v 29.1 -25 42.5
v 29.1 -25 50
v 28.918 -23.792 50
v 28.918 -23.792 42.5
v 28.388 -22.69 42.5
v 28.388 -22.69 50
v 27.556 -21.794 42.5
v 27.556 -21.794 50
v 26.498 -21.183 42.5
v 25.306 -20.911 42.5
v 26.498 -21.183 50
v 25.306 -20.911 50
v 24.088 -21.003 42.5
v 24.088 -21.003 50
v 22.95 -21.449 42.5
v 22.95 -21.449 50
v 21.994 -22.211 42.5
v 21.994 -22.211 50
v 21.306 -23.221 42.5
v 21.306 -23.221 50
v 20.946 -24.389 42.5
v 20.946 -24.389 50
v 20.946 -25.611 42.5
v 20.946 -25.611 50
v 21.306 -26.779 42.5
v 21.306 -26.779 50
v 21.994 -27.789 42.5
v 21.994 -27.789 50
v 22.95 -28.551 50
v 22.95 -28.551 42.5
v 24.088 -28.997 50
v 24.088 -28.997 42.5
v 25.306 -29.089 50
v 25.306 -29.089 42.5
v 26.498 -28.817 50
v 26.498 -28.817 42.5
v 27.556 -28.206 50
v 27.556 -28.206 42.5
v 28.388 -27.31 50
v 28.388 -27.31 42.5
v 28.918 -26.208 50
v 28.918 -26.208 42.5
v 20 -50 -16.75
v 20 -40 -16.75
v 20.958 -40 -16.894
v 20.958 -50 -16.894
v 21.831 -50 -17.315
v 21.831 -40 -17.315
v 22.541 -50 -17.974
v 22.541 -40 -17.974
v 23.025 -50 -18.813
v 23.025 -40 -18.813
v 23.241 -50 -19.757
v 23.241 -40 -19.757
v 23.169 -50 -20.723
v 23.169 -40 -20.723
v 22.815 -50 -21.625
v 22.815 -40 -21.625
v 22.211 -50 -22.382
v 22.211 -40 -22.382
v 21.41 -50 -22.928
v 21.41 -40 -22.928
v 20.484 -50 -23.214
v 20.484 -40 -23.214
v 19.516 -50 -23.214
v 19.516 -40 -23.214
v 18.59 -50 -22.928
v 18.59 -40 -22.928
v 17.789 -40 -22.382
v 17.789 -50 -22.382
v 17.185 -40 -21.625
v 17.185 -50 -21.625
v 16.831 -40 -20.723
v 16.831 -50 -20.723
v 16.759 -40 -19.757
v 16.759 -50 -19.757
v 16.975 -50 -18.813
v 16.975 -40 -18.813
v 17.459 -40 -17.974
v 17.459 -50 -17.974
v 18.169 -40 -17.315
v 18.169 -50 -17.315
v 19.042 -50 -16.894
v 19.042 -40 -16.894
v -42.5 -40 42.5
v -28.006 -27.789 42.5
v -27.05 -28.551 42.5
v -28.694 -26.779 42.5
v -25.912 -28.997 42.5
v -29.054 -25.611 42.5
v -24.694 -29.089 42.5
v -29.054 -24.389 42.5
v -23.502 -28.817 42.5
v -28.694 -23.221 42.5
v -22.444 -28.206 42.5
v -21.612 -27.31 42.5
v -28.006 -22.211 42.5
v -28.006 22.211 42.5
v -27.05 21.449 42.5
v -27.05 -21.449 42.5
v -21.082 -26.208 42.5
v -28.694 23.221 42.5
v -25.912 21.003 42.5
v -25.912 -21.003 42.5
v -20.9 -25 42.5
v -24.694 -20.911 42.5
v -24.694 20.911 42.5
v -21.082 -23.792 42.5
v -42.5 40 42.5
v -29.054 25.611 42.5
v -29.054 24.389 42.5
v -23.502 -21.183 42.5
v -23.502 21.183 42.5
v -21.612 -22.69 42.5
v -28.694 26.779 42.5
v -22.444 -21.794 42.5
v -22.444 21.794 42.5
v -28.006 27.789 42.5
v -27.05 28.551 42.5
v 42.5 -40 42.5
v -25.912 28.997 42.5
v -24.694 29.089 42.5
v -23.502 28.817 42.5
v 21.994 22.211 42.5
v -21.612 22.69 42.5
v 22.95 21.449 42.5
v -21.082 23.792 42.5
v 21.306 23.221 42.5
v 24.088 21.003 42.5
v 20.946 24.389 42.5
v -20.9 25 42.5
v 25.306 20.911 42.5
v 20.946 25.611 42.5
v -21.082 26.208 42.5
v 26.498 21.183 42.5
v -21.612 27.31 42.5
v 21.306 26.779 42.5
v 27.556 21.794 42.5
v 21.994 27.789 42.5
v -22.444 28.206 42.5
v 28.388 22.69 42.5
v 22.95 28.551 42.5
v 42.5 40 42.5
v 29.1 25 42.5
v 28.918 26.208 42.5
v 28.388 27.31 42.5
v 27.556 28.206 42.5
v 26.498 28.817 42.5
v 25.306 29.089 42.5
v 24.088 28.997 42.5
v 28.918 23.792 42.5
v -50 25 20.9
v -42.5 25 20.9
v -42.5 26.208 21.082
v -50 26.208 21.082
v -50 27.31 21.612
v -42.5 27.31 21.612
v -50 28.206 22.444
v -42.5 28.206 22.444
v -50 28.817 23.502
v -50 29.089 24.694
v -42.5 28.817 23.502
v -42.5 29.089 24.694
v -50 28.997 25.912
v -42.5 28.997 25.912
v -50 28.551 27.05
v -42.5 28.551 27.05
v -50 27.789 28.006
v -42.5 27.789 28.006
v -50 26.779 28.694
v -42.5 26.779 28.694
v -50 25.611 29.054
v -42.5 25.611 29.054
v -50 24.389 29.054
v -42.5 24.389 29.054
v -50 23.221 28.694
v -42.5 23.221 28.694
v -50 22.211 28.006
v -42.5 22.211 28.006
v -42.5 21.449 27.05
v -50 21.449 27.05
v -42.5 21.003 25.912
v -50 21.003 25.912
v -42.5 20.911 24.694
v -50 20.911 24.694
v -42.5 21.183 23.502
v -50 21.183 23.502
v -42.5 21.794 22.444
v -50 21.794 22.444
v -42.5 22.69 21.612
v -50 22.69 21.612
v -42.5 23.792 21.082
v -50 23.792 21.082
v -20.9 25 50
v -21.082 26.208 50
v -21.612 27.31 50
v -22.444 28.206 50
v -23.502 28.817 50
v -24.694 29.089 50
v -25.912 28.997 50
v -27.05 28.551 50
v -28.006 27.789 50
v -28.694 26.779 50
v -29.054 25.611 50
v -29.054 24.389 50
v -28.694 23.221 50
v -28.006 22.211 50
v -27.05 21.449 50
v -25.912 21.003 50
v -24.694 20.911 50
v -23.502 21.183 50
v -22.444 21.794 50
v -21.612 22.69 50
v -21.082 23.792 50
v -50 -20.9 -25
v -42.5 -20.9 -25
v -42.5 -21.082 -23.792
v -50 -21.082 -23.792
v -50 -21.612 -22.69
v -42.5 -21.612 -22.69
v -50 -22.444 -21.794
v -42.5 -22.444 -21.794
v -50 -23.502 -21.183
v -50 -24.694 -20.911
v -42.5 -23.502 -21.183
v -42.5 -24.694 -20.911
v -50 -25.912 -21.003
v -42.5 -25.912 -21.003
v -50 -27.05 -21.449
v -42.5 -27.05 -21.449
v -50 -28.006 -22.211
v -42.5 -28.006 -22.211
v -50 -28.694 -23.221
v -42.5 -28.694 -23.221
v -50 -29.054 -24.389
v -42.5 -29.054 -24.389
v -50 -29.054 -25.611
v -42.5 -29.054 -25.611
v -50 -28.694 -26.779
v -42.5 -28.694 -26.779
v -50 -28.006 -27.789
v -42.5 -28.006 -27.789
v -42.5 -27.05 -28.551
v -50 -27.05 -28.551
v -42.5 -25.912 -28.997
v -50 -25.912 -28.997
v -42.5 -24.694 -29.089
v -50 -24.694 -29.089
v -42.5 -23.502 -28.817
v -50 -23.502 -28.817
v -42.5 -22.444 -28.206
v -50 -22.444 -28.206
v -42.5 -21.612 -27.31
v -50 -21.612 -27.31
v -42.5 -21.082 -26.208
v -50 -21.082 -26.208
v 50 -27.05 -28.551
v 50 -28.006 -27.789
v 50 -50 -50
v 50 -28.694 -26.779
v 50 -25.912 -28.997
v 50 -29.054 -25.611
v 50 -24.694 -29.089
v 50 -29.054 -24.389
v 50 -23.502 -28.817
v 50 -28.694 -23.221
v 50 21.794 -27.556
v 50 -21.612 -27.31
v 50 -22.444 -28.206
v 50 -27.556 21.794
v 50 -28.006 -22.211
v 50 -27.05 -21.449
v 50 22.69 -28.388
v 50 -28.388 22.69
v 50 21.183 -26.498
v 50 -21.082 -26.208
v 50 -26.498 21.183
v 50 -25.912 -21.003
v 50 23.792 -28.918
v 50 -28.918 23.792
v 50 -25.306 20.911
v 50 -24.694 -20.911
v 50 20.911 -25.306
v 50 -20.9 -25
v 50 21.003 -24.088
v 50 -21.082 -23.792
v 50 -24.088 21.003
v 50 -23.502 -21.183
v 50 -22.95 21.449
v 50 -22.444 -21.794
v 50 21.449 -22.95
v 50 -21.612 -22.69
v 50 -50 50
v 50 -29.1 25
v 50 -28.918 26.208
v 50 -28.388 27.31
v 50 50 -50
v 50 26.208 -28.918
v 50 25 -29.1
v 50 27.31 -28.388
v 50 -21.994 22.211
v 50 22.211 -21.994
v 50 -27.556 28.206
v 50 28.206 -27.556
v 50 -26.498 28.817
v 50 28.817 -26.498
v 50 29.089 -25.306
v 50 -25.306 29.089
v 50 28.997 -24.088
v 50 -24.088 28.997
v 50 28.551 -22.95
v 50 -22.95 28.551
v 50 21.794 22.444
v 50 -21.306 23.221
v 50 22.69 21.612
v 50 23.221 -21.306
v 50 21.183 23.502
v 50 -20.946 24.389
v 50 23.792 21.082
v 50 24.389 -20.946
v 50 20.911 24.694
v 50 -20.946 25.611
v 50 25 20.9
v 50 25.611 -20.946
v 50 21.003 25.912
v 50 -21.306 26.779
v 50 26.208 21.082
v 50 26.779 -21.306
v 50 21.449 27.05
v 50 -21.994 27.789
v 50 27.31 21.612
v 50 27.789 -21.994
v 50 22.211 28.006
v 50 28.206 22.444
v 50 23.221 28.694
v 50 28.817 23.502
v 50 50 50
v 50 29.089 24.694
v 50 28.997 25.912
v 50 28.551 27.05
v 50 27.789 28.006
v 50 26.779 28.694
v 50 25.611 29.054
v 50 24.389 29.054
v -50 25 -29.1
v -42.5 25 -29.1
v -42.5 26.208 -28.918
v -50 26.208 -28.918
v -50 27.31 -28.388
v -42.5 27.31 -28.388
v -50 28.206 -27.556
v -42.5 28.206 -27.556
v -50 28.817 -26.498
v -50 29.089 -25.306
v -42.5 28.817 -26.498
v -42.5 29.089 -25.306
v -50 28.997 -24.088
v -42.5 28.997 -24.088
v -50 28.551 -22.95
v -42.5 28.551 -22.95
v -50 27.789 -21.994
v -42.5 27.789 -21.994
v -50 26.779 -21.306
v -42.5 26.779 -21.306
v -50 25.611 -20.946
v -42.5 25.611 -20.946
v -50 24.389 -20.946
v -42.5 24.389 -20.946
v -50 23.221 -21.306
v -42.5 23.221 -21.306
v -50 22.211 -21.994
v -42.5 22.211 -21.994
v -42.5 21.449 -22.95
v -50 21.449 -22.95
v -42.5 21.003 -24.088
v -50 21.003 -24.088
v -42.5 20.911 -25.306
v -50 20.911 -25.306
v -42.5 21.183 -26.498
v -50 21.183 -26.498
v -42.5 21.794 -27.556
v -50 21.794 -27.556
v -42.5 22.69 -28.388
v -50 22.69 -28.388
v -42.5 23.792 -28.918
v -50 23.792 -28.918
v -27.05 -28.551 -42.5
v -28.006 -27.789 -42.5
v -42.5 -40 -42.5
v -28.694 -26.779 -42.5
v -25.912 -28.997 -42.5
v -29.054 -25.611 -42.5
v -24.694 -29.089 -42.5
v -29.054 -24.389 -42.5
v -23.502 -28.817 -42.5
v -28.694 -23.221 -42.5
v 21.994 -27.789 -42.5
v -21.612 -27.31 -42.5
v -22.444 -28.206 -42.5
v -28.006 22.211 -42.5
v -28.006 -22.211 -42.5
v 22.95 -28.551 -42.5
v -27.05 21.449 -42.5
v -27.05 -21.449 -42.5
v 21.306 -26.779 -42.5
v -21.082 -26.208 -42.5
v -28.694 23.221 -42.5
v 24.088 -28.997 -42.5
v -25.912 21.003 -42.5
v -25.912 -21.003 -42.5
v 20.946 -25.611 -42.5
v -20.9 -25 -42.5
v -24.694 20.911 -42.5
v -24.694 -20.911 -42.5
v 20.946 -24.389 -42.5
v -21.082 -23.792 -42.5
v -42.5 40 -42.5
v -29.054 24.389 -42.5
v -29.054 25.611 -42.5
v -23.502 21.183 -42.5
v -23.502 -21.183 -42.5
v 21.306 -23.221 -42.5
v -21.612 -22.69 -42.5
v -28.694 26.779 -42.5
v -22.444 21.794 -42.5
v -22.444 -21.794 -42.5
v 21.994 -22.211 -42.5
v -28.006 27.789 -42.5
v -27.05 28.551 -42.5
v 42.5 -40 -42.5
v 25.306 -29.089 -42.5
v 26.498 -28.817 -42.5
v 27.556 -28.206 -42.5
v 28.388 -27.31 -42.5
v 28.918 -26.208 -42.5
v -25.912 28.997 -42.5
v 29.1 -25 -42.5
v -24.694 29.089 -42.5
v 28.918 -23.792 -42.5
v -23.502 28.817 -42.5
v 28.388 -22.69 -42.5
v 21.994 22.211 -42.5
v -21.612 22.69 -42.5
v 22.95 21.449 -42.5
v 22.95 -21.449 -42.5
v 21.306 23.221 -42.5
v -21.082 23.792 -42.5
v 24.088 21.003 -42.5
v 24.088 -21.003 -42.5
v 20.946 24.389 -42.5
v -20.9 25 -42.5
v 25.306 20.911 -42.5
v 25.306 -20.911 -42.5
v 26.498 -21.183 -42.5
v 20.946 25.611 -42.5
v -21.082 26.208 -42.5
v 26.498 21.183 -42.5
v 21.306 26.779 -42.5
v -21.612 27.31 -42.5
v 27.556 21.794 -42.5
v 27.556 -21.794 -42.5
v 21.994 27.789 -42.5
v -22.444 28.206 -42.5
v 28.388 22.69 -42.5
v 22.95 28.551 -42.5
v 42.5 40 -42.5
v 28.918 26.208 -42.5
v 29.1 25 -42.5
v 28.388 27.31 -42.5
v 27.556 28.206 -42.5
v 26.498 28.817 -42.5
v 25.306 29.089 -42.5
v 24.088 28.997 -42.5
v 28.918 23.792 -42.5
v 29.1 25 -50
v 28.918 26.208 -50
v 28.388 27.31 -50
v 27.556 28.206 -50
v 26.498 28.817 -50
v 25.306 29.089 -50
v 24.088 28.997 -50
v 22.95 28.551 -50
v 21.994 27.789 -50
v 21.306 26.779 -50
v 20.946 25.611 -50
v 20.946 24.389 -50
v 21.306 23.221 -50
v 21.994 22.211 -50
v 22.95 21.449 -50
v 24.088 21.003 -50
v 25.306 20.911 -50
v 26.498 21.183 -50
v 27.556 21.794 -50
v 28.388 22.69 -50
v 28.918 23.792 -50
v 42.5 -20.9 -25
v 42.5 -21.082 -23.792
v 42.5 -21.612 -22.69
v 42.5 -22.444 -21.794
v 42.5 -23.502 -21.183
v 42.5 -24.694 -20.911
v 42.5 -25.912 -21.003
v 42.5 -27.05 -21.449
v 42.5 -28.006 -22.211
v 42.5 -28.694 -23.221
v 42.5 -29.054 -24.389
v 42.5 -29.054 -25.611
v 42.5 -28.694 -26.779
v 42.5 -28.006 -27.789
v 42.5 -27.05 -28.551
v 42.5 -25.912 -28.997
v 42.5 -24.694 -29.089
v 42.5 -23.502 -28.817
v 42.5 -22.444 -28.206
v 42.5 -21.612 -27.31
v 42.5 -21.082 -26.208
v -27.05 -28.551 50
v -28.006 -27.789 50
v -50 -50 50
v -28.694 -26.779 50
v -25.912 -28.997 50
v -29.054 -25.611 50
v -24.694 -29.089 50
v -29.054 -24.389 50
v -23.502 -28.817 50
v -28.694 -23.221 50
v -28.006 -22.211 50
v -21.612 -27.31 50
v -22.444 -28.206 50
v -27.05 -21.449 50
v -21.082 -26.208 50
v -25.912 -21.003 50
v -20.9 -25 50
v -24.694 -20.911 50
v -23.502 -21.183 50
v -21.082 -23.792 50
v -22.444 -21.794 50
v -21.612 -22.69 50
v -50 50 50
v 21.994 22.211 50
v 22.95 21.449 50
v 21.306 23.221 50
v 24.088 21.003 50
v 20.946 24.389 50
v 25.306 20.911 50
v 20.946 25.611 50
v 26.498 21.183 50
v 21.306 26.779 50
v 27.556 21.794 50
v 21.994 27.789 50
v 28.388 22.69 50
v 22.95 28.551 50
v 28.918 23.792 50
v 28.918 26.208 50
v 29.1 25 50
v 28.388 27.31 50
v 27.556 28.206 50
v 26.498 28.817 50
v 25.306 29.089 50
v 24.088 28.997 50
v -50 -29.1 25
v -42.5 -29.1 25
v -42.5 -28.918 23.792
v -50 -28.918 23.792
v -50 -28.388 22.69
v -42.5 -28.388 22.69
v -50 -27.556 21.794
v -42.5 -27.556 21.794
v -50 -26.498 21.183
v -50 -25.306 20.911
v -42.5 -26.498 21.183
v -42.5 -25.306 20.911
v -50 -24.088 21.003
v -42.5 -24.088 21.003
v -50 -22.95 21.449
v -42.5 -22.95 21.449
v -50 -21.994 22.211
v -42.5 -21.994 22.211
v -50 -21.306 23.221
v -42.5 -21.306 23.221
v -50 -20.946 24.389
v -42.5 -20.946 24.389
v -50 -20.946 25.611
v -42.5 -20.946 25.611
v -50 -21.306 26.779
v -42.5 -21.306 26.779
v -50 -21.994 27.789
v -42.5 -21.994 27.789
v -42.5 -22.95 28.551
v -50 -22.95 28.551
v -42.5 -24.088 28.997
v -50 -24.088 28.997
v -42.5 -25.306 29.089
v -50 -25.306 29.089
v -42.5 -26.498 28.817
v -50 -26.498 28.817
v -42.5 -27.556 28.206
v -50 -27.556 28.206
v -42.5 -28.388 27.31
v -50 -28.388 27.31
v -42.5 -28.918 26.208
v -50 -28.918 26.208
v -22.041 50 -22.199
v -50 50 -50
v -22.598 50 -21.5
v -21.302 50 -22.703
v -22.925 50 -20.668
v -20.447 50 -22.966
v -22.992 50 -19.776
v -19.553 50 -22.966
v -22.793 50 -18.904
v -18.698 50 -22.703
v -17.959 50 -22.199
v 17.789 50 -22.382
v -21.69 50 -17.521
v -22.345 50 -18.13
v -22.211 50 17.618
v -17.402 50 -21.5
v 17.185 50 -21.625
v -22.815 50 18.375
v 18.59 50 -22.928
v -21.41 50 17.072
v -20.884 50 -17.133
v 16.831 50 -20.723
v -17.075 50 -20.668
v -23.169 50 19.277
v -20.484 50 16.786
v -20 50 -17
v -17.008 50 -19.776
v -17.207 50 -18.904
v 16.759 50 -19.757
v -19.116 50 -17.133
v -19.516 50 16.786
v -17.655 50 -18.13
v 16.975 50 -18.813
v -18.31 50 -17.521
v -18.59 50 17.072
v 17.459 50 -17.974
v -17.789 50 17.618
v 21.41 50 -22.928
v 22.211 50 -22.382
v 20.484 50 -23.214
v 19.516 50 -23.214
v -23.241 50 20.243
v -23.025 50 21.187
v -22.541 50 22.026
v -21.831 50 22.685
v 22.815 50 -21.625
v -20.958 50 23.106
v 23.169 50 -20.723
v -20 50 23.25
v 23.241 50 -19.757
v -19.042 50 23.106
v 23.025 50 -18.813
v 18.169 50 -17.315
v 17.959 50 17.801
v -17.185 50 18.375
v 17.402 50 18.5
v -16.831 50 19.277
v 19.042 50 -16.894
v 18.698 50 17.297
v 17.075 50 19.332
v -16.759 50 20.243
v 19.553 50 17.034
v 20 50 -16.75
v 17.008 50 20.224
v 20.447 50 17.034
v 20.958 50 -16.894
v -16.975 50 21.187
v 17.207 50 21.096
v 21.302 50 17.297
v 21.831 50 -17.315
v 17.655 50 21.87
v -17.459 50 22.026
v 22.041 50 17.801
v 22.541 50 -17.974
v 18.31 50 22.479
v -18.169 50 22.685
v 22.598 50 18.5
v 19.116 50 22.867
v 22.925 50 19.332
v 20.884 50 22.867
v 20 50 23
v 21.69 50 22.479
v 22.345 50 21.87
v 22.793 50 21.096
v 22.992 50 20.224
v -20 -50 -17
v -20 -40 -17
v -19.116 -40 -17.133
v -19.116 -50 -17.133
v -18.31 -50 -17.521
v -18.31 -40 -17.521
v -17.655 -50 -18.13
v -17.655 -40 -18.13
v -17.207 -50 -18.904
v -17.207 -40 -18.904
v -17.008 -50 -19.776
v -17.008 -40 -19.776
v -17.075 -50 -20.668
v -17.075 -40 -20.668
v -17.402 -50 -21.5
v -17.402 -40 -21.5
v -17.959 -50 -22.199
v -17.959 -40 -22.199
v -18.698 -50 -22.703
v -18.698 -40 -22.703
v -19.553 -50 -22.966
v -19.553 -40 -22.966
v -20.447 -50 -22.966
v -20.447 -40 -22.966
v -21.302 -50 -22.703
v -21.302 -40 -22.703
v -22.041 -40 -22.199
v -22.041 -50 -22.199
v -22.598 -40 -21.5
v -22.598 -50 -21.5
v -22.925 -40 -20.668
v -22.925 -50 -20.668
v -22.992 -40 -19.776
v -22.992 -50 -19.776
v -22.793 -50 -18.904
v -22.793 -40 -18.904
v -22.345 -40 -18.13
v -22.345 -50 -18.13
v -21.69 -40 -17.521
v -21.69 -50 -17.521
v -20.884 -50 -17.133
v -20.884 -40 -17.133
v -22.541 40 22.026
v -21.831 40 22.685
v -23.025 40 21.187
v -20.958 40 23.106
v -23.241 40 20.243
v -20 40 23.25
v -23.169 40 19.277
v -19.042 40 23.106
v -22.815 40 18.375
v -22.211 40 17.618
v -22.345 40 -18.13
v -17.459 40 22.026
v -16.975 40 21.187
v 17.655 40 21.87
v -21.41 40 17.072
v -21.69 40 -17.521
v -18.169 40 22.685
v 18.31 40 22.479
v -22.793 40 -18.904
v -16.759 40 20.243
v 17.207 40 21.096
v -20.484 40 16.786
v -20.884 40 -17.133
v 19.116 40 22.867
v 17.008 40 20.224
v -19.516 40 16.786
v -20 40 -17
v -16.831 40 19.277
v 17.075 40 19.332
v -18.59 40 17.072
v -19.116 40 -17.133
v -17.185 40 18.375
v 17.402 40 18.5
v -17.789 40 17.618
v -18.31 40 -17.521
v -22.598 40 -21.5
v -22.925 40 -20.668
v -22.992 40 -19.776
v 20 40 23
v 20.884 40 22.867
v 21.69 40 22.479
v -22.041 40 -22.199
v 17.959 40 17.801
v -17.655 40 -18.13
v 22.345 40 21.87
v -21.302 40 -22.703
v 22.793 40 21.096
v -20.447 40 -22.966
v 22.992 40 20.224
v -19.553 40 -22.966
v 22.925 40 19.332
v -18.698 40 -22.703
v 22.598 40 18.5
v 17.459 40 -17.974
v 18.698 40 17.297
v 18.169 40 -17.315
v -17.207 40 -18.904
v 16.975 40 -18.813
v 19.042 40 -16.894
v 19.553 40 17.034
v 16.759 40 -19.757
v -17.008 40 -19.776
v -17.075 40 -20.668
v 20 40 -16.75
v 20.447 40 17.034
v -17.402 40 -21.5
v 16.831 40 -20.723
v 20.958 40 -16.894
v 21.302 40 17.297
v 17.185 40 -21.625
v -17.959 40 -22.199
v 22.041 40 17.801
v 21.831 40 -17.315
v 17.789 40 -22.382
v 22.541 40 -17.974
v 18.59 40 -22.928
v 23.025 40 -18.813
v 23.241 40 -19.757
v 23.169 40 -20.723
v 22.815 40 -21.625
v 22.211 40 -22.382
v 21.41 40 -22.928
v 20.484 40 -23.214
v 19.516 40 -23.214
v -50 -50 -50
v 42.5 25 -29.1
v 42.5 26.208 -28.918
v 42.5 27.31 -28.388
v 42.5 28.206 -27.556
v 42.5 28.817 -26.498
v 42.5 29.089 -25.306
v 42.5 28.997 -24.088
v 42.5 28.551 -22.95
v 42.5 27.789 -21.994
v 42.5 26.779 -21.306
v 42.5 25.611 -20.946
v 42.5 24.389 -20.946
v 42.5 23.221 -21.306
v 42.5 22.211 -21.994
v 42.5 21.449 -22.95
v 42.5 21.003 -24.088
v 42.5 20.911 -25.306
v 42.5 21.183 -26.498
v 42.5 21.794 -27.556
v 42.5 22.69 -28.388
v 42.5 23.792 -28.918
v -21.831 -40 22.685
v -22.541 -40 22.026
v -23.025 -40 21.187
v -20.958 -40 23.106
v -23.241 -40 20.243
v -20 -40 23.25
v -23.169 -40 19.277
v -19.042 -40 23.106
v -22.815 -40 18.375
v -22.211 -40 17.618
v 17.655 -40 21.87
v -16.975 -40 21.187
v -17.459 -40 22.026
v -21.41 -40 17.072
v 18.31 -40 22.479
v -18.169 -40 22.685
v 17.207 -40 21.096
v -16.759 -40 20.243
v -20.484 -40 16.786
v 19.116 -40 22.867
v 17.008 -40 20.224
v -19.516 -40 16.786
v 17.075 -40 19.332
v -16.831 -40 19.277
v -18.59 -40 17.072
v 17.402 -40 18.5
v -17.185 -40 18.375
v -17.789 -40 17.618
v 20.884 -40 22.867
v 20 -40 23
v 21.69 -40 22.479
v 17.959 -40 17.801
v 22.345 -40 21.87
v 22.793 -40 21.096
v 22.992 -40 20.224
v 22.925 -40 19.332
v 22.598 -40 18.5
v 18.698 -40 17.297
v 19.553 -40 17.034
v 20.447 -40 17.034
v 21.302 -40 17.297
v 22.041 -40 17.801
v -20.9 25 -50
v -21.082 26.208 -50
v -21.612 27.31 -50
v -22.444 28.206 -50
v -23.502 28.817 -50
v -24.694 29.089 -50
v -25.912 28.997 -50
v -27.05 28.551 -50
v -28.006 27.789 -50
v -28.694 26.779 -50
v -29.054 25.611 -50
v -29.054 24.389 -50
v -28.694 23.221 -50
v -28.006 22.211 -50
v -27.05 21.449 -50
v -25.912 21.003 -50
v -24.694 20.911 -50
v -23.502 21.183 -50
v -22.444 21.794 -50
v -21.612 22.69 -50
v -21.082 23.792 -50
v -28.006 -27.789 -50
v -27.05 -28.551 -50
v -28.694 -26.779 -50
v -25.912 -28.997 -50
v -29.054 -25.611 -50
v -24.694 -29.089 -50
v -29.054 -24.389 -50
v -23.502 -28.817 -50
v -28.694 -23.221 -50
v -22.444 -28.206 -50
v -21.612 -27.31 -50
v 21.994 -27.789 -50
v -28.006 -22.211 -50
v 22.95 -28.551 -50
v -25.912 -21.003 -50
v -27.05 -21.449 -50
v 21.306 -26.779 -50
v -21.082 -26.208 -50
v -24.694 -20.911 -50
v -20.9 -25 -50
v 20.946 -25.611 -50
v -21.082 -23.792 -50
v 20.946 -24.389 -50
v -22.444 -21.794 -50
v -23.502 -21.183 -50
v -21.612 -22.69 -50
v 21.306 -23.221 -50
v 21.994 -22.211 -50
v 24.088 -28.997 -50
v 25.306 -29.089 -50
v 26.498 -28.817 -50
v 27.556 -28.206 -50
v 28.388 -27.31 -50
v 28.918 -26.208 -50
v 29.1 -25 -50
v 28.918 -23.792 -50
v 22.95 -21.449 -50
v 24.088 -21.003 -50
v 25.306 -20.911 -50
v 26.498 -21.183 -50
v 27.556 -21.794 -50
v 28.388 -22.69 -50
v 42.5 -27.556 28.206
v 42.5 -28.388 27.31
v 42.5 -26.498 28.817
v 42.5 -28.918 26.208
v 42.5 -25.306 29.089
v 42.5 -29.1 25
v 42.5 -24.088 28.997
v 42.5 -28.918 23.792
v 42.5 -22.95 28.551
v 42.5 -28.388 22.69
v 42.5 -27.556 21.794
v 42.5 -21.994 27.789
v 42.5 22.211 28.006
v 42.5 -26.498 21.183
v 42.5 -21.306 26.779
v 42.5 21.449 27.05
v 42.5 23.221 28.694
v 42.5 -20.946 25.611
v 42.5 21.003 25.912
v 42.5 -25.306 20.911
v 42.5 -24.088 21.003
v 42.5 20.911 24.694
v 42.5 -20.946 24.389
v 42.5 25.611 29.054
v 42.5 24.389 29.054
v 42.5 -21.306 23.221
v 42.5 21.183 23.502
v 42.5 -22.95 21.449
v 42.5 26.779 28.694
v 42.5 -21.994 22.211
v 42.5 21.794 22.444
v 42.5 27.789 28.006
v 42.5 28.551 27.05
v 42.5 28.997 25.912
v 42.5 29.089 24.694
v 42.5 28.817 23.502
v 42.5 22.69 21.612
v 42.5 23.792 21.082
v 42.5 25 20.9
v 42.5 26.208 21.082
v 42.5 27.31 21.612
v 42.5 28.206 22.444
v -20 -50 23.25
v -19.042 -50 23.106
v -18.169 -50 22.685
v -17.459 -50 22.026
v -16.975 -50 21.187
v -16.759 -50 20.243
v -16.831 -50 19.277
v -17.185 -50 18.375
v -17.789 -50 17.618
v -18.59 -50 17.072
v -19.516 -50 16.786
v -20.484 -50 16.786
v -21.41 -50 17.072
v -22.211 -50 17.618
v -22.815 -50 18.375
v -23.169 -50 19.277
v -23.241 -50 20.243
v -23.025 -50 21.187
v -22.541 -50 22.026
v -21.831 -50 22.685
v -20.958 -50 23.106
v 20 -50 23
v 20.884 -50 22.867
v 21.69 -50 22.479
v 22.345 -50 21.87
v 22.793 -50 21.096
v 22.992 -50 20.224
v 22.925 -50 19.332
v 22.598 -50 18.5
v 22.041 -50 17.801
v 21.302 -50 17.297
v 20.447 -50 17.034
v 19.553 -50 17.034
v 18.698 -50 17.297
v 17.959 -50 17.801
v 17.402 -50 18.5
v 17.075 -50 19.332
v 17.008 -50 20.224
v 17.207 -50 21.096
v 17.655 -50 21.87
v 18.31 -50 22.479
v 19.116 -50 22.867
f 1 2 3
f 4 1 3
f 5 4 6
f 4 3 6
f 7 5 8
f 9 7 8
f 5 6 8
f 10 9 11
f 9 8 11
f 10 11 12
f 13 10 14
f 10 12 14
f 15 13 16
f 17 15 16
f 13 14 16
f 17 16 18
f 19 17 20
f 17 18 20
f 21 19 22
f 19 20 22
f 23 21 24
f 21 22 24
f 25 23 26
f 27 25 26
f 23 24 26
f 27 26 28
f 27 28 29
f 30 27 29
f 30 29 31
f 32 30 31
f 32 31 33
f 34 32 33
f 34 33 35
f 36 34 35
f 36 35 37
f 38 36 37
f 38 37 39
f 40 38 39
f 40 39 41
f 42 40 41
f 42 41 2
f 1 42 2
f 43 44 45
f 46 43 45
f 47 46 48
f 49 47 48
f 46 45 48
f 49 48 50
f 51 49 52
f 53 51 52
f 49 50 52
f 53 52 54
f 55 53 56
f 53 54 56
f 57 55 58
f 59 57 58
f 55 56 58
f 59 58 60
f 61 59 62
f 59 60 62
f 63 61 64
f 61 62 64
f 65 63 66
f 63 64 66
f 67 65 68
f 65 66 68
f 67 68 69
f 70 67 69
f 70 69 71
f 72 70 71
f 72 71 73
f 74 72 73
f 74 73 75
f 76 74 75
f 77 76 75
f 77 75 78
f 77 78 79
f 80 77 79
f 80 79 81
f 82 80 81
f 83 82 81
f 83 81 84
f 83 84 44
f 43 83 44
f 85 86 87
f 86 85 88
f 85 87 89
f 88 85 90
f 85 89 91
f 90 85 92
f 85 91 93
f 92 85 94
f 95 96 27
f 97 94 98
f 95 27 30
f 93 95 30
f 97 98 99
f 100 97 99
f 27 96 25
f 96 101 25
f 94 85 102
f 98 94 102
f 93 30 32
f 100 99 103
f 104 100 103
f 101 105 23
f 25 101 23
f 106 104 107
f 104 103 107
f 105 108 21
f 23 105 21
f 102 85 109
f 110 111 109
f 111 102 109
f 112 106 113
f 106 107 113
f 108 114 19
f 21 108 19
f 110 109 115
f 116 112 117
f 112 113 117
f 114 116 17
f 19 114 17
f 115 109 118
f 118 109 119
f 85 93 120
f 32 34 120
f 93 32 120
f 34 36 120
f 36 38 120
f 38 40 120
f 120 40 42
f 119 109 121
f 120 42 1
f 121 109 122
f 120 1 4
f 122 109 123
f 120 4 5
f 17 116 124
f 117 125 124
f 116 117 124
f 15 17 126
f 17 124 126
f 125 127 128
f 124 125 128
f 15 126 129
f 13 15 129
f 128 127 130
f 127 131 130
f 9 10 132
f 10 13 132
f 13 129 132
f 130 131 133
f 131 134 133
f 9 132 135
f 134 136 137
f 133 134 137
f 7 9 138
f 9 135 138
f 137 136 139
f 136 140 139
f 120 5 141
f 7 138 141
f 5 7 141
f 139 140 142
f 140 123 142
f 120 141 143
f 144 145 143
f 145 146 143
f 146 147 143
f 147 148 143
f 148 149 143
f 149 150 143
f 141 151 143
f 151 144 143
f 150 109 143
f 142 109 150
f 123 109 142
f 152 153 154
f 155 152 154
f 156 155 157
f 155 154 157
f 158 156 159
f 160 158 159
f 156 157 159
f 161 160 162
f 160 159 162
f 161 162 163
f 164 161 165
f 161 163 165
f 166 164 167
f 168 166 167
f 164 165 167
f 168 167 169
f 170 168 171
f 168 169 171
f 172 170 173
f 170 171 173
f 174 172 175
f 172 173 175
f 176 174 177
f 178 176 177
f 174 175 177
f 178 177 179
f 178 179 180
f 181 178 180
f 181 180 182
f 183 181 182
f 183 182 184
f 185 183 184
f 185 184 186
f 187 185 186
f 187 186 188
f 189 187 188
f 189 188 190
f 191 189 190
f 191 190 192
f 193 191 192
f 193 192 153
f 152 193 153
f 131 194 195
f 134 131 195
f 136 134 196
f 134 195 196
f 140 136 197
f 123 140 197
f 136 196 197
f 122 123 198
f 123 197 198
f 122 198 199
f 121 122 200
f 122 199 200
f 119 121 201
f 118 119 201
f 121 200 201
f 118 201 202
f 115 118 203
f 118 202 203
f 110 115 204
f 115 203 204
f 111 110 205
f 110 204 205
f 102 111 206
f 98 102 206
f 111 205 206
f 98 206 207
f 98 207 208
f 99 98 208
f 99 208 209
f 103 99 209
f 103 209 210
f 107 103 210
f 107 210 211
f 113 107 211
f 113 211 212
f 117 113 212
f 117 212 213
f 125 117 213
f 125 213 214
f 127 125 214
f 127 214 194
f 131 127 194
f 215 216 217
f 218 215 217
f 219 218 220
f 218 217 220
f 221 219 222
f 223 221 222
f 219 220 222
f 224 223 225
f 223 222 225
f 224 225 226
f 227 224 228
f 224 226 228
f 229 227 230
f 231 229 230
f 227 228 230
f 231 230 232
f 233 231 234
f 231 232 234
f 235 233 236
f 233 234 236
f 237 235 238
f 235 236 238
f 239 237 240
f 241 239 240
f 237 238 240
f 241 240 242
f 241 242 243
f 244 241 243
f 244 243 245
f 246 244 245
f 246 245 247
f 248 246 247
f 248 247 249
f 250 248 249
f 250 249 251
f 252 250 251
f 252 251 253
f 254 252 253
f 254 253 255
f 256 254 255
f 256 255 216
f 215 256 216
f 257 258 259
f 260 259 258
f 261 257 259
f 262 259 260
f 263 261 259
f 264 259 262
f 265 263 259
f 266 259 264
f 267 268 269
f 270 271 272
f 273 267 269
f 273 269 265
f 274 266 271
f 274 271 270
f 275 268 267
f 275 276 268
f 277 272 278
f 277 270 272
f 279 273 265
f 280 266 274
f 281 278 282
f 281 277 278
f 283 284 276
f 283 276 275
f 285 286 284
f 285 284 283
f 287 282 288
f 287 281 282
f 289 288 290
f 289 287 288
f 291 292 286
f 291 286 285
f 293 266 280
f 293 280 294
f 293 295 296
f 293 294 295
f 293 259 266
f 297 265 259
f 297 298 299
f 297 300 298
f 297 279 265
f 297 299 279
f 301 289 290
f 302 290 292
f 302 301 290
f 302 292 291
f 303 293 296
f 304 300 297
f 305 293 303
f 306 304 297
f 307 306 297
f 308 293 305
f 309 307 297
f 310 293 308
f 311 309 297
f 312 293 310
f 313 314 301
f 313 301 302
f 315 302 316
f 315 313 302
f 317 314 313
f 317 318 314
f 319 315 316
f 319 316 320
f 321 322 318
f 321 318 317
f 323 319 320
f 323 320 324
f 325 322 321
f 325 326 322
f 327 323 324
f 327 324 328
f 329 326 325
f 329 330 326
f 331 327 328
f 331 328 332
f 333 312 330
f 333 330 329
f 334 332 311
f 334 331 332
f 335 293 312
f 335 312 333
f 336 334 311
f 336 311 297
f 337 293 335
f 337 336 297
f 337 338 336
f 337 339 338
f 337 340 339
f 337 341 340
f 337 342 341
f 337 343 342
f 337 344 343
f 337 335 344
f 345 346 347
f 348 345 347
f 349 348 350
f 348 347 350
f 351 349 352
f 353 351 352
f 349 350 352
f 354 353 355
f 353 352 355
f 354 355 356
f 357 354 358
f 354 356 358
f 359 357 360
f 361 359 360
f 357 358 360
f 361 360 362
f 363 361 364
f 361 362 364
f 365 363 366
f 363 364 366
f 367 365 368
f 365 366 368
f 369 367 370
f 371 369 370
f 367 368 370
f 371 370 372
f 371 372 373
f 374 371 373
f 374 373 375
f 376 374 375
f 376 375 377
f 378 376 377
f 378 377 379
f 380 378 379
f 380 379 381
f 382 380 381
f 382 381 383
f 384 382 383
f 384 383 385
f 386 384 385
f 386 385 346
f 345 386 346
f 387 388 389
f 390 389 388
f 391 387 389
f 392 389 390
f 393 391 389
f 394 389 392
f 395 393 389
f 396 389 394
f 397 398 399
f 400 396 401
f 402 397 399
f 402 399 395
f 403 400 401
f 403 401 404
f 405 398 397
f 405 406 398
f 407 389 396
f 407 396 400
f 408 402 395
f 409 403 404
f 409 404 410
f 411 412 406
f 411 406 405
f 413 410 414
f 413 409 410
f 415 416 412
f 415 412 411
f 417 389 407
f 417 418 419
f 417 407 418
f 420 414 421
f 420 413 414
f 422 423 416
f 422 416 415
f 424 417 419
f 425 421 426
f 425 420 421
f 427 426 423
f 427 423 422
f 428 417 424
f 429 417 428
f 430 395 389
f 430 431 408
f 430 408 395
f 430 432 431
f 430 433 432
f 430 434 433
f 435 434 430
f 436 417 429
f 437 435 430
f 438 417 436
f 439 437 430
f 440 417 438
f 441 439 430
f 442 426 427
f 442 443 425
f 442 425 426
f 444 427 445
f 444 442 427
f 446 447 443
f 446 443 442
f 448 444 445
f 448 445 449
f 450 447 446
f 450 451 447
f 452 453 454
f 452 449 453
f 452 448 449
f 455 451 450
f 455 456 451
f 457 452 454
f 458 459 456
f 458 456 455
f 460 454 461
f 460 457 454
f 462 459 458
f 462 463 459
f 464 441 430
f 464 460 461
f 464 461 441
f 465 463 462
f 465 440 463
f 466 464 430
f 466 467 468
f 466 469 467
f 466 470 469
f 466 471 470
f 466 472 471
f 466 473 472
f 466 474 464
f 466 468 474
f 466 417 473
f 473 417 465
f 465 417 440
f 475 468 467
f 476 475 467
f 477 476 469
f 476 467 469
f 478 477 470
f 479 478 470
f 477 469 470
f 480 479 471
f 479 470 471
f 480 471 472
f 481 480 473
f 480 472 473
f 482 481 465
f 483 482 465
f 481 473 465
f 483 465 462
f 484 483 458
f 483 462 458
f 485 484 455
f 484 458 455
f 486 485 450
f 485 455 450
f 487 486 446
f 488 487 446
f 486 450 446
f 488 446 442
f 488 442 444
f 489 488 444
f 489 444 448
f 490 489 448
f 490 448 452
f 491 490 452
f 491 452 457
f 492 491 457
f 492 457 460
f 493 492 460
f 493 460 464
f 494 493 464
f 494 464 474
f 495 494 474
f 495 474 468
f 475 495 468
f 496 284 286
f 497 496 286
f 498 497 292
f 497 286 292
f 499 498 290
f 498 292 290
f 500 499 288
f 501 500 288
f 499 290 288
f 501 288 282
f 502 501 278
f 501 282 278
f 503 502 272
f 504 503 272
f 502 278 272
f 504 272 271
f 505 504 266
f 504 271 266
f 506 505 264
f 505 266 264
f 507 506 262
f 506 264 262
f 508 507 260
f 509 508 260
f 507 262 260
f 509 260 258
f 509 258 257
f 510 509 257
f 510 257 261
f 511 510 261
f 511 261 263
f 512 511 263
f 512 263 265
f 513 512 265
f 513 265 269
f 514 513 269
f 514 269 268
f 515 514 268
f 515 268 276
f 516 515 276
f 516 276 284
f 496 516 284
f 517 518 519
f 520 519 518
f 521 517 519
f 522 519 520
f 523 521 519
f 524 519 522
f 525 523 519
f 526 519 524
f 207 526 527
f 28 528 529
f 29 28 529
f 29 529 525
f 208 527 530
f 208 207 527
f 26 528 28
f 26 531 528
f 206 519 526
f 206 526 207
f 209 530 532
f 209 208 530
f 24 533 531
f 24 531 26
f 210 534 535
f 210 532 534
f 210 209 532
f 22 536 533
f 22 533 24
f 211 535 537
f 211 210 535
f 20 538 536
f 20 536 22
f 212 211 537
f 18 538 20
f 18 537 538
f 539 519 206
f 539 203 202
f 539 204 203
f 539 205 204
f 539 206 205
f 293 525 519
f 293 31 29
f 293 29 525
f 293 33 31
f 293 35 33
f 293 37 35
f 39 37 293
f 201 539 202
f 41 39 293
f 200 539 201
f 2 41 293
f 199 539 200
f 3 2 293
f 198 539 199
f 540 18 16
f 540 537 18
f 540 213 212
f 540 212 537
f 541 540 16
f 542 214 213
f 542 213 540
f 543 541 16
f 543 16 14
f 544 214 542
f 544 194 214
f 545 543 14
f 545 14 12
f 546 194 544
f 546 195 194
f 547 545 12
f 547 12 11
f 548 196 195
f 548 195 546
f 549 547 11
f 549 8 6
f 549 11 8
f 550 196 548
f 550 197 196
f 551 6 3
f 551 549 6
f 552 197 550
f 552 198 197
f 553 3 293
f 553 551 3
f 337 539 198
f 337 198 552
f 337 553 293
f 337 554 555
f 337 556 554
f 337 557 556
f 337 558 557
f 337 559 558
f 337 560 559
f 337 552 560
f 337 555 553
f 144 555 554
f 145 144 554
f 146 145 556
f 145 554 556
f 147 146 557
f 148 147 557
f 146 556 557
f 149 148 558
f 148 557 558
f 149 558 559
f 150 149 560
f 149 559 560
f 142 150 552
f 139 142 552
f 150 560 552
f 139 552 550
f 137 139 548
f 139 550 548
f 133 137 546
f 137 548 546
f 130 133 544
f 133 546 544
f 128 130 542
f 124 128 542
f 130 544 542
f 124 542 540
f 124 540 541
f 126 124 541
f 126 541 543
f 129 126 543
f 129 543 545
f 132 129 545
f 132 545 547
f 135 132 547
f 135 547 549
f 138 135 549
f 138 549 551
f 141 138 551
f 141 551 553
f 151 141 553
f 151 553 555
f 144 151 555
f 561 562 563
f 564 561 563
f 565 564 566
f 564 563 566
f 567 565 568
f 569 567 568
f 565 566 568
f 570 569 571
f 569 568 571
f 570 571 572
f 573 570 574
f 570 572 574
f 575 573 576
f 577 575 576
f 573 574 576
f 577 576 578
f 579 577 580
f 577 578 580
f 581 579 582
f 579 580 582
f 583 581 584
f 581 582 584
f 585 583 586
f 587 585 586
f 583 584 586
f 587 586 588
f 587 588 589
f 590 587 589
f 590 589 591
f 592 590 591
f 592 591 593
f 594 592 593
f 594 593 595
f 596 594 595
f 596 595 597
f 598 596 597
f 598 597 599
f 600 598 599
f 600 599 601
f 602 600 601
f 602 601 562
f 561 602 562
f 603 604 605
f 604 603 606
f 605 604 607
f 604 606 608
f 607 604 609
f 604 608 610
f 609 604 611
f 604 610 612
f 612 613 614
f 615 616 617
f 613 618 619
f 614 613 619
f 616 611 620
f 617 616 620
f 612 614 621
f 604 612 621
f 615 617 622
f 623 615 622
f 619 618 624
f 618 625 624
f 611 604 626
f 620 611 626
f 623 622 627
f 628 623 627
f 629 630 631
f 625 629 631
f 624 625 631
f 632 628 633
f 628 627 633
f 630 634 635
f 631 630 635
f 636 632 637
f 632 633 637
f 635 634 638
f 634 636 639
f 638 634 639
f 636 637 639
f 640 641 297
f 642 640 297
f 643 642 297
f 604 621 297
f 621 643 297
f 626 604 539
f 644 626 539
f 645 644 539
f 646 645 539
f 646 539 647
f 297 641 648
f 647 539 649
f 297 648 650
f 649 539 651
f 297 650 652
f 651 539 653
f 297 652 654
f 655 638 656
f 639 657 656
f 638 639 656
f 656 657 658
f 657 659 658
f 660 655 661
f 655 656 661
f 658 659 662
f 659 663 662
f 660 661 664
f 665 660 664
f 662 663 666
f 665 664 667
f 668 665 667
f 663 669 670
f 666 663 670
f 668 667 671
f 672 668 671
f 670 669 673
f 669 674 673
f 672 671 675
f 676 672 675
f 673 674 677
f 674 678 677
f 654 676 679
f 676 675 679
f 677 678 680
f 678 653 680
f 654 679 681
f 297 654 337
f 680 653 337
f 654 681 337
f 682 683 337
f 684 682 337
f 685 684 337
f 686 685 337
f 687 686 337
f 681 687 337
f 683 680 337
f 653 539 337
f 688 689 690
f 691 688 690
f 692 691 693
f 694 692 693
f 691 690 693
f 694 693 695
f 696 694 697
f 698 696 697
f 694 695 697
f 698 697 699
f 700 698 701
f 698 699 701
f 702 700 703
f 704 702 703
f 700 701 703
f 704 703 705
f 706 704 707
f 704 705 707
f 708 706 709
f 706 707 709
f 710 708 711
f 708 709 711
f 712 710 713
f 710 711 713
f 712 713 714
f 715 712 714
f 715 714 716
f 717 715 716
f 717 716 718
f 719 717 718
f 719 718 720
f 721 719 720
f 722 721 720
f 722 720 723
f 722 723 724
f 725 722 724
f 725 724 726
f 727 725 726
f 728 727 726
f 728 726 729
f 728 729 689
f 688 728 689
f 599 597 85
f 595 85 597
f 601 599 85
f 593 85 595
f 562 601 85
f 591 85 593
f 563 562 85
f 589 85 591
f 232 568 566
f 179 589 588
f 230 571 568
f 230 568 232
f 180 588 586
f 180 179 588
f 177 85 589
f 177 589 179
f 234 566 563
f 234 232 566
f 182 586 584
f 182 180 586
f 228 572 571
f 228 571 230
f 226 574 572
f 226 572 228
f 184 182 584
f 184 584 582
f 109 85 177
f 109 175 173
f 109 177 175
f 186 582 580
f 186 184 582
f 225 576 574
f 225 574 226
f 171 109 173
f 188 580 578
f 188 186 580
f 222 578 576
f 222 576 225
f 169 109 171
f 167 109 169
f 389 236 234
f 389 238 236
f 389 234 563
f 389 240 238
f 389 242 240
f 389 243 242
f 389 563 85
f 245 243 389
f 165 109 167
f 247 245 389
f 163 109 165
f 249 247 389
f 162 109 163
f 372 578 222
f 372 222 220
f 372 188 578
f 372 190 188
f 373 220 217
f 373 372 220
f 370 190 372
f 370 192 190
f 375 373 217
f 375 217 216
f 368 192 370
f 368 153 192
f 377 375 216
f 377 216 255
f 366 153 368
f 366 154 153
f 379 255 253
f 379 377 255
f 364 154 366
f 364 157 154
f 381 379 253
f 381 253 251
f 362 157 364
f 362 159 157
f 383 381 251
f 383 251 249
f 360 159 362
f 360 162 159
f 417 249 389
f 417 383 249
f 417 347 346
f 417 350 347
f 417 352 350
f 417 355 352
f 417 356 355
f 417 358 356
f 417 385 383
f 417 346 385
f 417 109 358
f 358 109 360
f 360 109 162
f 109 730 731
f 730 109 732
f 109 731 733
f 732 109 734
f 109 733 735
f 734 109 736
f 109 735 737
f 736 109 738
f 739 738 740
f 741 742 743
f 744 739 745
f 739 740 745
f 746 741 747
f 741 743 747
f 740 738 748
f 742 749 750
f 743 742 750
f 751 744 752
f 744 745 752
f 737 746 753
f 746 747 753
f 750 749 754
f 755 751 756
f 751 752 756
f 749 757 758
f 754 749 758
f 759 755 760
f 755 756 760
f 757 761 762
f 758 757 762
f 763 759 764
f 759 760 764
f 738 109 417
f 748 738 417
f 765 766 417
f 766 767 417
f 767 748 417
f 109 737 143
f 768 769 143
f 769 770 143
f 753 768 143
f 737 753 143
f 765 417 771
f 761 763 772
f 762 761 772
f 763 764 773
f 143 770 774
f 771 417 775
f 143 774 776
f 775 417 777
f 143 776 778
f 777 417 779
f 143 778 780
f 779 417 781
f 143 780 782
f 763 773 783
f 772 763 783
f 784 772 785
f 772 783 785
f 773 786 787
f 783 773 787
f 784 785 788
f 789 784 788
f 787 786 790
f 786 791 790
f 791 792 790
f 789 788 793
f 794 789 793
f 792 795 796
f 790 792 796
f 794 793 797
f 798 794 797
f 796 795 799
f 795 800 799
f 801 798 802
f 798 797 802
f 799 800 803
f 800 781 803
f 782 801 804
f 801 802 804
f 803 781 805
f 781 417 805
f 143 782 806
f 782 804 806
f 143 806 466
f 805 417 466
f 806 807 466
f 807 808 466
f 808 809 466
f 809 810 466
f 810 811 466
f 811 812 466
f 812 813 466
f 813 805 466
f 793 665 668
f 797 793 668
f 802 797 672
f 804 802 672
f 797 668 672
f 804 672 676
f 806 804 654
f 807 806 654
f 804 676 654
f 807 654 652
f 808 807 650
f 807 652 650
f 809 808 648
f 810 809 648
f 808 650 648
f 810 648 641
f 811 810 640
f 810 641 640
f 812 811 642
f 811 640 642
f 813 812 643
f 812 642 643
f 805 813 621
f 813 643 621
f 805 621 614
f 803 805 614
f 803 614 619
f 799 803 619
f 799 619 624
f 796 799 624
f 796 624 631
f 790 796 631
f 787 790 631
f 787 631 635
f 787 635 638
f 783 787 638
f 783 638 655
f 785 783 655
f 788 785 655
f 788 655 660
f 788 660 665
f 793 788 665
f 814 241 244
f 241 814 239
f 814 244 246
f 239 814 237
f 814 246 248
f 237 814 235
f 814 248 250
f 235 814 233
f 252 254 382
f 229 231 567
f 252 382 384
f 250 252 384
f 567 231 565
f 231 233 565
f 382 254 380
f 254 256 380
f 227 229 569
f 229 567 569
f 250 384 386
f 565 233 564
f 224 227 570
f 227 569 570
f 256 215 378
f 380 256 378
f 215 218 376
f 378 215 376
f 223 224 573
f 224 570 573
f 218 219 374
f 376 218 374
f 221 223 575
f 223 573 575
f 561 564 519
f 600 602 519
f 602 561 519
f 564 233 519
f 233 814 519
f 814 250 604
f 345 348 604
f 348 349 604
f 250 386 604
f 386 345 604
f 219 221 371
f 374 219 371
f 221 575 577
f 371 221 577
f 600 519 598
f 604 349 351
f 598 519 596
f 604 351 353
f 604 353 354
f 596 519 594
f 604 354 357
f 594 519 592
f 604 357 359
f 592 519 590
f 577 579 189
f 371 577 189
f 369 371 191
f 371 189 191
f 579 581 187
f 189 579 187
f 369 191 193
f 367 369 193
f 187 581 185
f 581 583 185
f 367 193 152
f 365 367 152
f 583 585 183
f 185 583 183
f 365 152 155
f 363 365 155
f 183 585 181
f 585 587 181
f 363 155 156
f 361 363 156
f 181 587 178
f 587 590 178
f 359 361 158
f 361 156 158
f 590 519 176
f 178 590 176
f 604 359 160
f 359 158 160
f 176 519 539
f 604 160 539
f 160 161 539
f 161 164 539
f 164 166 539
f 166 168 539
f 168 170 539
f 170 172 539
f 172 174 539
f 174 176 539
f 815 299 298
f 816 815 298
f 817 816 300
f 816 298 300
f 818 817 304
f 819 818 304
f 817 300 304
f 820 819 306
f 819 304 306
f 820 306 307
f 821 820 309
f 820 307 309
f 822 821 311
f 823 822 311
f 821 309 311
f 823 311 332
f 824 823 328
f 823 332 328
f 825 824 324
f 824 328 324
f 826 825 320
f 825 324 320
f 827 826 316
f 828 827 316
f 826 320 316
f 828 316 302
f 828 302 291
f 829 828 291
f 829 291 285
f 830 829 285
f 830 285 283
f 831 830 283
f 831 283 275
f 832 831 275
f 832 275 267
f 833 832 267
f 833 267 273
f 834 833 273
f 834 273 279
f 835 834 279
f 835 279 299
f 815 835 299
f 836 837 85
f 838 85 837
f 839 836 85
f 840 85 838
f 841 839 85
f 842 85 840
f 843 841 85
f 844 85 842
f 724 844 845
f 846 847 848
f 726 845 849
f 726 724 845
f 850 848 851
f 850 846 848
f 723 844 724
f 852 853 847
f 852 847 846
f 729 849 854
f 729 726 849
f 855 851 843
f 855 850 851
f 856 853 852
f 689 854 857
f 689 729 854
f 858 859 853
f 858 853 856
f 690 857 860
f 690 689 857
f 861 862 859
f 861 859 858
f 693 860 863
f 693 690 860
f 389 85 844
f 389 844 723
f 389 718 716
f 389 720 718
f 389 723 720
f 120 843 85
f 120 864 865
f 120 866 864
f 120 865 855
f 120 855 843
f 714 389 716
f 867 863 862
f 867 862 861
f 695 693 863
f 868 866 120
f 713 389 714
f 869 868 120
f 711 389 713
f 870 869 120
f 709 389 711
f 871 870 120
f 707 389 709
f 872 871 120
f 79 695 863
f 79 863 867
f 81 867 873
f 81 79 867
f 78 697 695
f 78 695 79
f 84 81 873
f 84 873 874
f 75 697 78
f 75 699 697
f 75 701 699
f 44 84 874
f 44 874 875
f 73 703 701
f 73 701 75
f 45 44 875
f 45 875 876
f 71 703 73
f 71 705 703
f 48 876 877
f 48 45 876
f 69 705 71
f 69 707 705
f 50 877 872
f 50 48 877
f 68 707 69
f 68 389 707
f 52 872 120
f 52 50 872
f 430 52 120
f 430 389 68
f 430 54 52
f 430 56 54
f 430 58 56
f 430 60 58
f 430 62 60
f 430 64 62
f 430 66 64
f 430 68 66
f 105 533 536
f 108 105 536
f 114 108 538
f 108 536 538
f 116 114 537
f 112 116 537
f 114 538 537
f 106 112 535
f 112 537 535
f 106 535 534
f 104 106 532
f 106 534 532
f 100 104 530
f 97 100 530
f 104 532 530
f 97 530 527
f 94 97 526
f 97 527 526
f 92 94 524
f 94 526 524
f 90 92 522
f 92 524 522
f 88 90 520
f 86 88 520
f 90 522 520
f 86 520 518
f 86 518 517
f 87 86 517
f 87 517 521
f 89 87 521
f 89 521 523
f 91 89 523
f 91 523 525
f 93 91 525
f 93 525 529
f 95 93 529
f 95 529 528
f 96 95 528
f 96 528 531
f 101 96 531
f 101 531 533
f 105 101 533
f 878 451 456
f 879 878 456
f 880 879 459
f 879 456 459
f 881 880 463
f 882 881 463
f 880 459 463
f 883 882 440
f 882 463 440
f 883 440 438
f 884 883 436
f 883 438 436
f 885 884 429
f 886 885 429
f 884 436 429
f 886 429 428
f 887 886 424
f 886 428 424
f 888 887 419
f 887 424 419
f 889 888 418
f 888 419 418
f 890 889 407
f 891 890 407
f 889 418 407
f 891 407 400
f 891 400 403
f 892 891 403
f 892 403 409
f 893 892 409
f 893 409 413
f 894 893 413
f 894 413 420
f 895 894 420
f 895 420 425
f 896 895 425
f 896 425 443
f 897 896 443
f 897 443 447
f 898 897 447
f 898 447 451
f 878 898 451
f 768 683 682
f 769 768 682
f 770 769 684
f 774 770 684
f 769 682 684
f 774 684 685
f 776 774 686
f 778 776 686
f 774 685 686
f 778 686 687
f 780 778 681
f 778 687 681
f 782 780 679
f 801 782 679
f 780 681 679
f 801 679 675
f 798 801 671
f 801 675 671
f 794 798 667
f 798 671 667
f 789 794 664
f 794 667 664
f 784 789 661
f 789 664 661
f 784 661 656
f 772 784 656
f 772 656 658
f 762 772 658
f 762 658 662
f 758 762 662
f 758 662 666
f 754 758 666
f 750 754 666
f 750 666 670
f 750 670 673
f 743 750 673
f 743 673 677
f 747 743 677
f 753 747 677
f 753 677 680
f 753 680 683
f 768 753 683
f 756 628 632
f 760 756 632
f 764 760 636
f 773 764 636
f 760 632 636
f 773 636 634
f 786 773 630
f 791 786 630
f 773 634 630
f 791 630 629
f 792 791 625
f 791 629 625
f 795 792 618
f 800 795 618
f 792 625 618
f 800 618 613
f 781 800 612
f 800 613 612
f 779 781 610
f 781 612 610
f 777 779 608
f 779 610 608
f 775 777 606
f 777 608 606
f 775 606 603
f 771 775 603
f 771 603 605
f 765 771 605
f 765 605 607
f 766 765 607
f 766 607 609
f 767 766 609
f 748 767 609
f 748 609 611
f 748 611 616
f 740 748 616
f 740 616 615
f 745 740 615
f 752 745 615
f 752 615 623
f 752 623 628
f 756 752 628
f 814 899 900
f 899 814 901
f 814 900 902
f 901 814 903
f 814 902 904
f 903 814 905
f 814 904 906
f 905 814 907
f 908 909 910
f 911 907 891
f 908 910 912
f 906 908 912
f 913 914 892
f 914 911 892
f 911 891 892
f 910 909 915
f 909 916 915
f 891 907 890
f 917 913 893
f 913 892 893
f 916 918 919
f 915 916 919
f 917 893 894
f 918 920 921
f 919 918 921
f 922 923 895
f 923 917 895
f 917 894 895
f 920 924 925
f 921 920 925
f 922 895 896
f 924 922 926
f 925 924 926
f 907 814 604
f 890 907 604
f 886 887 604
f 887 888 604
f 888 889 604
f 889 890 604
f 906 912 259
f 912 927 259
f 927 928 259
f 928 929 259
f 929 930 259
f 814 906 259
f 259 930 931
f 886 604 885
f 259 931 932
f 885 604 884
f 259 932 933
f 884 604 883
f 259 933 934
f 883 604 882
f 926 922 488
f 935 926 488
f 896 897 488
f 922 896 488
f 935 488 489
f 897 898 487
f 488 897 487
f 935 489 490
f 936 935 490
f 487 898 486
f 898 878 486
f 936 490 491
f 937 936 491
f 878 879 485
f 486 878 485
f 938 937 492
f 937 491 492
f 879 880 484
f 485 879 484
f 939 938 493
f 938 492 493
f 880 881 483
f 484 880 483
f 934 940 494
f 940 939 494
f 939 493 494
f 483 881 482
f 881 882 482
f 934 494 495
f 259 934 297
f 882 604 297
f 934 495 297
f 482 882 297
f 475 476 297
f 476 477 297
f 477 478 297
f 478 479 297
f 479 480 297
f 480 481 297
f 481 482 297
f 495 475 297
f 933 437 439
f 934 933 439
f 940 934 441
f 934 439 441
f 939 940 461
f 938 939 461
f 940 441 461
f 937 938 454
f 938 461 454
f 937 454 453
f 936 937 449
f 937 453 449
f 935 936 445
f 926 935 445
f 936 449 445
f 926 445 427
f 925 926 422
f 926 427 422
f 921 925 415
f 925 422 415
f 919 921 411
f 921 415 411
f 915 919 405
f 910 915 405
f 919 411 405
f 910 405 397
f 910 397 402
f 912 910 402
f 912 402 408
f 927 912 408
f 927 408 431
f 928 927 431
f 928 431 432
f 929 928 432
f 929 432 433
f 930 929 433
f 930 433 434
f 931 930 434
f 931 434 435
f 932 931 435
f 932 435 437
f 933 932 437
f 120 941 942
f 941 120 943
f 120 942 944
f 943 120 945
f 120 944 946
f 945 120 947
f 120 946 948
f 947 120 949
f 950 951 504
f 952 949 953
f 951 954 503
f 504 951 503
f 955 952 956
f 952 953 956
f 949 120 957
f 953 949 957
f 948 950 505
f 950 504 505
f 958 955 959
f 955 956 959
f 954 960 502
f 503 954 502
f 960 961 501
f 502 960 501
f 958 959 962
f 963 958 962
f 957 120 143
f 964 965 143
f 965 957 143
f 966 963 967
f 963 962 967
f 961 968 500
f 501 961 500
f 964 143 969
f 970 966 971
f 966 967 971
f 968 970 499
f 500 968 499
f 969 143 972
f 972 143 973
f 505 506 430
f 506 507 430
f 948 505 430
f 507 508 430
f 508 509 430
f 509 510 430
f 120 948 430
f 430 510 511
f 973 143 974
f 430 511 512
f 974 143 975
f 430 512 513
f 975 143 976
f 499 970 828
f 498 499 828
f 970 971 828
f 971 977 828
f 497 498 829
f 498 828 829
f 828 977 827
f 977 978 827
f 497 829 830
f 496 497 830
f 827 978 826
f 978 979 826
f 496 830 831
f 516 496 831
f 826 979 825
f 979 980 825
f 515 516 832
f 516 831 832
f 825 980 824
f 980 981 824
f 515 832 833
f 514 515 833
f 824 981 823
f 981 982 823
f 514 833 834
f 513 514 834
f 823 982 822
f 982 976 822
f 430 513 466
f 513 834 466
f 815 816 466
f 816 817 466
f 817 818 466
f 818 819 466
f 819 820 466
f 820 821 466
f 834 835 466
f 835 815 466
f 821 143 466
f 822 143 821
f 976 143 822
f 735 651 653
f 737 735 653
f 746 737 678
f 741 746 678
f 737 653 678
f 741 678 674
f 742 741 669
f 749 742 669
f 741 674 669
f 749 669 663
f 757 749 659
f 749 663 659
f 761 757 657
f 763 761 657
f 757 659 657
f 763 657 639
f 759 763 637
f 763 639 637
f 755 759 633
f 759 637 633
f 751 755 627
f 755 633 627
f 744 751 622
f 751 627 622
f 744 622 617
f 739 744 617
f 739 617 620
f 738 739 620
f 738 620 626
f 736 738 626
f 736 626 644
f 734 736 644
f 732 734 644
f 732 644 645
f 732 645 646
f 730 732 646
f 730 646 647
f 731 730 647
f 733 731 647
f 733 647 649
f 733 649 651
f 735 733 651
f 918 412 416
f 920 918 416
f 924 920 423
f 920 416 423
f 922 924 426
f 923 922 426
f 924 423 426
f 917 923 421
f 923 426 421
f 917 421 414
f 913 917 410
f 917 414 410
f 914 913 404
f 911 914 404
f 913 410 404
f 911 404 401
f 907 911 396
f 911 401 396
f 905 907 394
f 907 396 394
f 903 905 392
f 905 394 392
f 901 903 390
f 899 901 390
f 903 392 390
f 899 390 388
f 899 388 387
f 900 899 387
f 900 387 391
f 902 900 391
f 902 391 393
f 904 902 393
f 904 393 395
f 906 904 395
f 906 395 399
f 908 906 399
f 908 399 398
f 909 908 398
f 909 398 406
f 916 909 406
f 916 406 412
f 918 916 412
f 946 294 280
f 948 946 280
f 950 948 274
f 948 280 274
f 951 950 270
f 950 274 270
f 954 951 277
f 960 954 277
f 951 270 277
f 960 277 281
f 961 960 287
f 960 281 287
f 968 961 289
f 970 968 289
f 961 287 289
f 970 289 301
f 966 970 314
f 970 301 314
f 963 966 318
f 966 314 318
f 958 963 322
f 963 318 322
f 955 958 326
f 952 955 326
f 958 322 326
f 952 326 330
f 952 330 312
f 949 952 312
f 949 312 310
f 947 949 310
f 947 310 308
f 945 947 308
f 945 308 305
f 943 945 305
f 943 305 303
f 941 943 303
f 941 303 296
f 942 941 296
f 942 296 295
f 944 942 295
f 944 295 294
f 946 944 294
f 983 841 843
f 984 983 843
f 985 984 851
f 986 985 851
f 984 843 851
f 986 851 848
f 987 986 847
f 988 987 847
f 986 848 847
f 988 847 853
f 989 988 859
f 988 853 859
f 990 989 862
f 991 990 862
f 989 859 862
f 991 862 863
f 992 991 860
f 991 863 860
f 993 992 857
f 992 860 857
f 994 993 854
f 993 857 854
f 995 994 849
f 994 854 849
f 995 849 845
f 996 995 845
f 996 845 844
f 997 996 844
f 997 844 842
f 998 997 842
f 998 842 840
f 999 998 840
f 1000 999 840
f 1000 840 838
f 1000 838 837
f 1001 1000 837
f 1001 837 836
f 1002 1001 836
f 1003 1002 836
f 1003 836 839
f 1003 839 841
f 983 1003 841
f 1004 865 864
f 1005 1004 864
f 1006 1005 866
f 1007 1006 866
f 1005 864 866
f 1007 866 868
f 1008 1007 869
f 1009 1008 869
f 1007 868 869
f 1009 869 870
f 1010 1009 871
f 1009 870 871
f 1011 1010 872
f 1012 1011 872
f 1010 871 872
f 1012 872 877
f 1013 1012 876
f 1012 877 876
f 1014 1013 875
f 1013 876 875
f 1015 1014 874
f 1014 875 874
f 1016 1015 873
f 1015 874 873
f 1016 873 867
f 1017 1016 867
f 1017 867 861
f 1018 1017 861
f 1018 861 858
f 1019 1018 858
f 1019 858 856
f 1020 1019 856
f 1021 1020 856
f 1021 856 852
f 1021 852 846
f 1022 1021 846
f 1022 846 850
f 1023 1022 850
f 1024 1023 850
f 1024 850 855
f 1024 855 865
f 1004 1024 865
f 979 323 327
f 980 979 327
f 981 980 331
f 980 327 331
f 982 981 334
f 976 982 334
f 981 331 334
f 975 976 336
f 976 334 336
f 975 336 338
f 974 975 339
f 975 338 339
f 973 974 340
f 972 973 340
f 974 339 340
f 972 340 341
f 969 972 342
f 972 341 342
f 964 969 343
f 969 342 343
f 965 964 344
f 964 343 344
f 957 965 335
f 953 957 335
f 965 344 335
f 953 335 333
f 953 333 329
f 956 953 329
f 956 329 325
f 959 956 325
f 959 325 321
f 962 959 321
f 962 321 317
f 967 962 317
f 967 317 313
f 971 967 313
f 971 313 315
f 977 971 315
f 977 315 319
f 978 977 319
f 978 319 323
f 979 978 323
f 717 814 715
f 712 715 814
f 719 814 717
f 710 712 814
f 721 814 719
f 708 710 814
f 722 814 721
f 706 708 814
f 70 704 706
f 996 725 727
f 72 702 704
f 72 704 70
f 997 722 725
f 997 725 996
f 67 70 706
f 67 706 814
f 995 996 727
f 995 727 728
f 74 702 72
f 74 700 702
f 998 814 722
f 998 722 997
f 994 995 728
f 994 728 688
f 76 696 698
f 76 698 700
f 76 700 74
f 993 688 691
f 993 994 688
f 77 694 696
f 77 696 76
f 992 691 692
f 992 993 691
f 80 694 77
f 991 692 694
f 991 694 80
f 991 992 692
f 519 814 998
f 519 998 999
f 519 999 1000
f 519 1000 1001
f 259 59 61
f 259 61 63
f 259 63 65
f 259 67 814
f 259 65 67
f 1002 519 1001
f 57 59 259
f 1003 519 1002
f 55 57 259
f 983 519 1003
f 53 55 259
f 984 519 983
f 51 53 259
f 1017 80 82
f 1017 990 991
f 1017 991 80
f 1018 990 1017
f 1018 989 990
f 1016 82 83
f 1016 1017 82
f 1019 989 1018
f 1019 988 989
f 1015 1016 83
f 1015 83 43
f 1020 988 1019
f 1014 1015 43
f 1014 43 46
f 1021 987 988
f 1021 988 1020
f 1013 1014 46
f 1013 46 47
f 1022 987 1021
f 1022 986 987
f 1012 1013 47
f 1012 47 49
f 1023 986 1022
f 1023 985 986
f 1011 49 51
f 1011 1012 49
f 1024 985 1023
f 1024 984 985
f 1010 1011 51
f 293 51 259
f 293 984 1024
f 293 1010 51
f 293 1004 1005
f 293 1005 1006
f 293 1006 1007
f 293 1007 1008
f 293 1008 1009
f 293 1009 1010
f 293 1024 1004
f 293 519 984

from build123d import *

# Parameters (mm, degrees)
SKETCH1_W           = 100
SKETCH1_H           = 100
BOSS_EXTRUDE1_DEPTH = 50
SKETCH2_R           = 4.1
CUT_EXTRUDE1_DEPTH  = 123.474487139
SKETCH3_R           = 4.1
CUT_EXTRUDE2_DEPTH  = 123.474487139
SKETCH4_R           = 3
SKETCH4_R_2         = 3.25
CUT_EXTRUDE3_DEPTH  = 123.474487139
SKETCH8_W           = 85
SKETCH8_H           = 85
CUT_EXTRUDE4_DEPTH  = 40


with BuildPart() as part:
    # Sketch1 → Boss-Extrude1 (new, symmetric)
    with BuildSketch(Plane.XY):
        Rectangle(SKETCH1_W, SKETCH1_H)
    extrude(amount=BOSS_EXTRUDE1_DEPTH, both=True)

    # Sketch2 → Cut-Extrude1 (cut, through all)
    with BuildSketch(Plane.XY.offset(50)):
        with Locations((-25, 25)):
            Circle(SKETCH2_R)
        with Locations((25, 25)):
            Circle(SKETCH2_R)
        with Locations((25, -25)):
            Circle(SKETCH2_R)
        with Locations((-25, -25)):
            Circle(SKETCH2_R)
    extrude(amount=-CUT_EXTRUDE1_DEPTH, mode=Mode.SUBTRACT)

    # Sketch3 → Cut-Extrude2 (cut, through all)
    with BuildSketch(Plane(origin=(50, 0, 0), x_dir=(0, 0, -1), z_dir=(1, 0, 0))):
        with Locations((-25, 25)):
            Circle(SKETCH3_R)
        with Locations((25, 25)):
            Circle(SKETCH3_R)
        with Locations(Location((25, -25, 0), (0, 0, 90))):
            Circle(SKETCH3_R)
        with Locations(Location((-25, -25, 0), (0, 0, 270))):
            Circle(SKETCH3_R)
    extrude(amount=-CUT_EXTRUDE2_DEPTH, mode=Mode.SUBTRACT)

    # Sketch4 → Cut-Extrude3 (cut, through all)
    with BuildSketch(Plane(origin=(0, 50, 0), x_dir=(1, 0, 0), z_dir=(0, 1, 0))):
        with Locations(Location((-20, 20, 0), (0, 0, 270))):
            Circle(SKETCH4_R)
        with Locations(Location((20, -20, 0), (0, 0, 270))):
            Circle(SKETCH4_R)
        with Locations(Location((20, 20, 0), (0, 0, 270))):
            Circle(SKETCH4_R_2)
        with Locations(Location((-20, -20, 0), (0, 0, 270))):
            Circle(SKETCH4_R_2)
    extrude(amount=-CUT_EXTRUDE3_DEPTH, mode=Mode.SUBTRACT)

    # Sketch8 → Cut-Extrude4 (cut, symmetric)
    with BuildSketch(Plane(origin=(0, 0, 0), x_dir=(1, 0, 0), z_dir=(0, 1, 0))):
        Rectangle(SKETCH8_W, SKETCH8_H)
    extrude(amount=CUT_EXTRUDE4_DEPTH, both=True, mode=Mode.SUBTRACT)


solid = part.part
